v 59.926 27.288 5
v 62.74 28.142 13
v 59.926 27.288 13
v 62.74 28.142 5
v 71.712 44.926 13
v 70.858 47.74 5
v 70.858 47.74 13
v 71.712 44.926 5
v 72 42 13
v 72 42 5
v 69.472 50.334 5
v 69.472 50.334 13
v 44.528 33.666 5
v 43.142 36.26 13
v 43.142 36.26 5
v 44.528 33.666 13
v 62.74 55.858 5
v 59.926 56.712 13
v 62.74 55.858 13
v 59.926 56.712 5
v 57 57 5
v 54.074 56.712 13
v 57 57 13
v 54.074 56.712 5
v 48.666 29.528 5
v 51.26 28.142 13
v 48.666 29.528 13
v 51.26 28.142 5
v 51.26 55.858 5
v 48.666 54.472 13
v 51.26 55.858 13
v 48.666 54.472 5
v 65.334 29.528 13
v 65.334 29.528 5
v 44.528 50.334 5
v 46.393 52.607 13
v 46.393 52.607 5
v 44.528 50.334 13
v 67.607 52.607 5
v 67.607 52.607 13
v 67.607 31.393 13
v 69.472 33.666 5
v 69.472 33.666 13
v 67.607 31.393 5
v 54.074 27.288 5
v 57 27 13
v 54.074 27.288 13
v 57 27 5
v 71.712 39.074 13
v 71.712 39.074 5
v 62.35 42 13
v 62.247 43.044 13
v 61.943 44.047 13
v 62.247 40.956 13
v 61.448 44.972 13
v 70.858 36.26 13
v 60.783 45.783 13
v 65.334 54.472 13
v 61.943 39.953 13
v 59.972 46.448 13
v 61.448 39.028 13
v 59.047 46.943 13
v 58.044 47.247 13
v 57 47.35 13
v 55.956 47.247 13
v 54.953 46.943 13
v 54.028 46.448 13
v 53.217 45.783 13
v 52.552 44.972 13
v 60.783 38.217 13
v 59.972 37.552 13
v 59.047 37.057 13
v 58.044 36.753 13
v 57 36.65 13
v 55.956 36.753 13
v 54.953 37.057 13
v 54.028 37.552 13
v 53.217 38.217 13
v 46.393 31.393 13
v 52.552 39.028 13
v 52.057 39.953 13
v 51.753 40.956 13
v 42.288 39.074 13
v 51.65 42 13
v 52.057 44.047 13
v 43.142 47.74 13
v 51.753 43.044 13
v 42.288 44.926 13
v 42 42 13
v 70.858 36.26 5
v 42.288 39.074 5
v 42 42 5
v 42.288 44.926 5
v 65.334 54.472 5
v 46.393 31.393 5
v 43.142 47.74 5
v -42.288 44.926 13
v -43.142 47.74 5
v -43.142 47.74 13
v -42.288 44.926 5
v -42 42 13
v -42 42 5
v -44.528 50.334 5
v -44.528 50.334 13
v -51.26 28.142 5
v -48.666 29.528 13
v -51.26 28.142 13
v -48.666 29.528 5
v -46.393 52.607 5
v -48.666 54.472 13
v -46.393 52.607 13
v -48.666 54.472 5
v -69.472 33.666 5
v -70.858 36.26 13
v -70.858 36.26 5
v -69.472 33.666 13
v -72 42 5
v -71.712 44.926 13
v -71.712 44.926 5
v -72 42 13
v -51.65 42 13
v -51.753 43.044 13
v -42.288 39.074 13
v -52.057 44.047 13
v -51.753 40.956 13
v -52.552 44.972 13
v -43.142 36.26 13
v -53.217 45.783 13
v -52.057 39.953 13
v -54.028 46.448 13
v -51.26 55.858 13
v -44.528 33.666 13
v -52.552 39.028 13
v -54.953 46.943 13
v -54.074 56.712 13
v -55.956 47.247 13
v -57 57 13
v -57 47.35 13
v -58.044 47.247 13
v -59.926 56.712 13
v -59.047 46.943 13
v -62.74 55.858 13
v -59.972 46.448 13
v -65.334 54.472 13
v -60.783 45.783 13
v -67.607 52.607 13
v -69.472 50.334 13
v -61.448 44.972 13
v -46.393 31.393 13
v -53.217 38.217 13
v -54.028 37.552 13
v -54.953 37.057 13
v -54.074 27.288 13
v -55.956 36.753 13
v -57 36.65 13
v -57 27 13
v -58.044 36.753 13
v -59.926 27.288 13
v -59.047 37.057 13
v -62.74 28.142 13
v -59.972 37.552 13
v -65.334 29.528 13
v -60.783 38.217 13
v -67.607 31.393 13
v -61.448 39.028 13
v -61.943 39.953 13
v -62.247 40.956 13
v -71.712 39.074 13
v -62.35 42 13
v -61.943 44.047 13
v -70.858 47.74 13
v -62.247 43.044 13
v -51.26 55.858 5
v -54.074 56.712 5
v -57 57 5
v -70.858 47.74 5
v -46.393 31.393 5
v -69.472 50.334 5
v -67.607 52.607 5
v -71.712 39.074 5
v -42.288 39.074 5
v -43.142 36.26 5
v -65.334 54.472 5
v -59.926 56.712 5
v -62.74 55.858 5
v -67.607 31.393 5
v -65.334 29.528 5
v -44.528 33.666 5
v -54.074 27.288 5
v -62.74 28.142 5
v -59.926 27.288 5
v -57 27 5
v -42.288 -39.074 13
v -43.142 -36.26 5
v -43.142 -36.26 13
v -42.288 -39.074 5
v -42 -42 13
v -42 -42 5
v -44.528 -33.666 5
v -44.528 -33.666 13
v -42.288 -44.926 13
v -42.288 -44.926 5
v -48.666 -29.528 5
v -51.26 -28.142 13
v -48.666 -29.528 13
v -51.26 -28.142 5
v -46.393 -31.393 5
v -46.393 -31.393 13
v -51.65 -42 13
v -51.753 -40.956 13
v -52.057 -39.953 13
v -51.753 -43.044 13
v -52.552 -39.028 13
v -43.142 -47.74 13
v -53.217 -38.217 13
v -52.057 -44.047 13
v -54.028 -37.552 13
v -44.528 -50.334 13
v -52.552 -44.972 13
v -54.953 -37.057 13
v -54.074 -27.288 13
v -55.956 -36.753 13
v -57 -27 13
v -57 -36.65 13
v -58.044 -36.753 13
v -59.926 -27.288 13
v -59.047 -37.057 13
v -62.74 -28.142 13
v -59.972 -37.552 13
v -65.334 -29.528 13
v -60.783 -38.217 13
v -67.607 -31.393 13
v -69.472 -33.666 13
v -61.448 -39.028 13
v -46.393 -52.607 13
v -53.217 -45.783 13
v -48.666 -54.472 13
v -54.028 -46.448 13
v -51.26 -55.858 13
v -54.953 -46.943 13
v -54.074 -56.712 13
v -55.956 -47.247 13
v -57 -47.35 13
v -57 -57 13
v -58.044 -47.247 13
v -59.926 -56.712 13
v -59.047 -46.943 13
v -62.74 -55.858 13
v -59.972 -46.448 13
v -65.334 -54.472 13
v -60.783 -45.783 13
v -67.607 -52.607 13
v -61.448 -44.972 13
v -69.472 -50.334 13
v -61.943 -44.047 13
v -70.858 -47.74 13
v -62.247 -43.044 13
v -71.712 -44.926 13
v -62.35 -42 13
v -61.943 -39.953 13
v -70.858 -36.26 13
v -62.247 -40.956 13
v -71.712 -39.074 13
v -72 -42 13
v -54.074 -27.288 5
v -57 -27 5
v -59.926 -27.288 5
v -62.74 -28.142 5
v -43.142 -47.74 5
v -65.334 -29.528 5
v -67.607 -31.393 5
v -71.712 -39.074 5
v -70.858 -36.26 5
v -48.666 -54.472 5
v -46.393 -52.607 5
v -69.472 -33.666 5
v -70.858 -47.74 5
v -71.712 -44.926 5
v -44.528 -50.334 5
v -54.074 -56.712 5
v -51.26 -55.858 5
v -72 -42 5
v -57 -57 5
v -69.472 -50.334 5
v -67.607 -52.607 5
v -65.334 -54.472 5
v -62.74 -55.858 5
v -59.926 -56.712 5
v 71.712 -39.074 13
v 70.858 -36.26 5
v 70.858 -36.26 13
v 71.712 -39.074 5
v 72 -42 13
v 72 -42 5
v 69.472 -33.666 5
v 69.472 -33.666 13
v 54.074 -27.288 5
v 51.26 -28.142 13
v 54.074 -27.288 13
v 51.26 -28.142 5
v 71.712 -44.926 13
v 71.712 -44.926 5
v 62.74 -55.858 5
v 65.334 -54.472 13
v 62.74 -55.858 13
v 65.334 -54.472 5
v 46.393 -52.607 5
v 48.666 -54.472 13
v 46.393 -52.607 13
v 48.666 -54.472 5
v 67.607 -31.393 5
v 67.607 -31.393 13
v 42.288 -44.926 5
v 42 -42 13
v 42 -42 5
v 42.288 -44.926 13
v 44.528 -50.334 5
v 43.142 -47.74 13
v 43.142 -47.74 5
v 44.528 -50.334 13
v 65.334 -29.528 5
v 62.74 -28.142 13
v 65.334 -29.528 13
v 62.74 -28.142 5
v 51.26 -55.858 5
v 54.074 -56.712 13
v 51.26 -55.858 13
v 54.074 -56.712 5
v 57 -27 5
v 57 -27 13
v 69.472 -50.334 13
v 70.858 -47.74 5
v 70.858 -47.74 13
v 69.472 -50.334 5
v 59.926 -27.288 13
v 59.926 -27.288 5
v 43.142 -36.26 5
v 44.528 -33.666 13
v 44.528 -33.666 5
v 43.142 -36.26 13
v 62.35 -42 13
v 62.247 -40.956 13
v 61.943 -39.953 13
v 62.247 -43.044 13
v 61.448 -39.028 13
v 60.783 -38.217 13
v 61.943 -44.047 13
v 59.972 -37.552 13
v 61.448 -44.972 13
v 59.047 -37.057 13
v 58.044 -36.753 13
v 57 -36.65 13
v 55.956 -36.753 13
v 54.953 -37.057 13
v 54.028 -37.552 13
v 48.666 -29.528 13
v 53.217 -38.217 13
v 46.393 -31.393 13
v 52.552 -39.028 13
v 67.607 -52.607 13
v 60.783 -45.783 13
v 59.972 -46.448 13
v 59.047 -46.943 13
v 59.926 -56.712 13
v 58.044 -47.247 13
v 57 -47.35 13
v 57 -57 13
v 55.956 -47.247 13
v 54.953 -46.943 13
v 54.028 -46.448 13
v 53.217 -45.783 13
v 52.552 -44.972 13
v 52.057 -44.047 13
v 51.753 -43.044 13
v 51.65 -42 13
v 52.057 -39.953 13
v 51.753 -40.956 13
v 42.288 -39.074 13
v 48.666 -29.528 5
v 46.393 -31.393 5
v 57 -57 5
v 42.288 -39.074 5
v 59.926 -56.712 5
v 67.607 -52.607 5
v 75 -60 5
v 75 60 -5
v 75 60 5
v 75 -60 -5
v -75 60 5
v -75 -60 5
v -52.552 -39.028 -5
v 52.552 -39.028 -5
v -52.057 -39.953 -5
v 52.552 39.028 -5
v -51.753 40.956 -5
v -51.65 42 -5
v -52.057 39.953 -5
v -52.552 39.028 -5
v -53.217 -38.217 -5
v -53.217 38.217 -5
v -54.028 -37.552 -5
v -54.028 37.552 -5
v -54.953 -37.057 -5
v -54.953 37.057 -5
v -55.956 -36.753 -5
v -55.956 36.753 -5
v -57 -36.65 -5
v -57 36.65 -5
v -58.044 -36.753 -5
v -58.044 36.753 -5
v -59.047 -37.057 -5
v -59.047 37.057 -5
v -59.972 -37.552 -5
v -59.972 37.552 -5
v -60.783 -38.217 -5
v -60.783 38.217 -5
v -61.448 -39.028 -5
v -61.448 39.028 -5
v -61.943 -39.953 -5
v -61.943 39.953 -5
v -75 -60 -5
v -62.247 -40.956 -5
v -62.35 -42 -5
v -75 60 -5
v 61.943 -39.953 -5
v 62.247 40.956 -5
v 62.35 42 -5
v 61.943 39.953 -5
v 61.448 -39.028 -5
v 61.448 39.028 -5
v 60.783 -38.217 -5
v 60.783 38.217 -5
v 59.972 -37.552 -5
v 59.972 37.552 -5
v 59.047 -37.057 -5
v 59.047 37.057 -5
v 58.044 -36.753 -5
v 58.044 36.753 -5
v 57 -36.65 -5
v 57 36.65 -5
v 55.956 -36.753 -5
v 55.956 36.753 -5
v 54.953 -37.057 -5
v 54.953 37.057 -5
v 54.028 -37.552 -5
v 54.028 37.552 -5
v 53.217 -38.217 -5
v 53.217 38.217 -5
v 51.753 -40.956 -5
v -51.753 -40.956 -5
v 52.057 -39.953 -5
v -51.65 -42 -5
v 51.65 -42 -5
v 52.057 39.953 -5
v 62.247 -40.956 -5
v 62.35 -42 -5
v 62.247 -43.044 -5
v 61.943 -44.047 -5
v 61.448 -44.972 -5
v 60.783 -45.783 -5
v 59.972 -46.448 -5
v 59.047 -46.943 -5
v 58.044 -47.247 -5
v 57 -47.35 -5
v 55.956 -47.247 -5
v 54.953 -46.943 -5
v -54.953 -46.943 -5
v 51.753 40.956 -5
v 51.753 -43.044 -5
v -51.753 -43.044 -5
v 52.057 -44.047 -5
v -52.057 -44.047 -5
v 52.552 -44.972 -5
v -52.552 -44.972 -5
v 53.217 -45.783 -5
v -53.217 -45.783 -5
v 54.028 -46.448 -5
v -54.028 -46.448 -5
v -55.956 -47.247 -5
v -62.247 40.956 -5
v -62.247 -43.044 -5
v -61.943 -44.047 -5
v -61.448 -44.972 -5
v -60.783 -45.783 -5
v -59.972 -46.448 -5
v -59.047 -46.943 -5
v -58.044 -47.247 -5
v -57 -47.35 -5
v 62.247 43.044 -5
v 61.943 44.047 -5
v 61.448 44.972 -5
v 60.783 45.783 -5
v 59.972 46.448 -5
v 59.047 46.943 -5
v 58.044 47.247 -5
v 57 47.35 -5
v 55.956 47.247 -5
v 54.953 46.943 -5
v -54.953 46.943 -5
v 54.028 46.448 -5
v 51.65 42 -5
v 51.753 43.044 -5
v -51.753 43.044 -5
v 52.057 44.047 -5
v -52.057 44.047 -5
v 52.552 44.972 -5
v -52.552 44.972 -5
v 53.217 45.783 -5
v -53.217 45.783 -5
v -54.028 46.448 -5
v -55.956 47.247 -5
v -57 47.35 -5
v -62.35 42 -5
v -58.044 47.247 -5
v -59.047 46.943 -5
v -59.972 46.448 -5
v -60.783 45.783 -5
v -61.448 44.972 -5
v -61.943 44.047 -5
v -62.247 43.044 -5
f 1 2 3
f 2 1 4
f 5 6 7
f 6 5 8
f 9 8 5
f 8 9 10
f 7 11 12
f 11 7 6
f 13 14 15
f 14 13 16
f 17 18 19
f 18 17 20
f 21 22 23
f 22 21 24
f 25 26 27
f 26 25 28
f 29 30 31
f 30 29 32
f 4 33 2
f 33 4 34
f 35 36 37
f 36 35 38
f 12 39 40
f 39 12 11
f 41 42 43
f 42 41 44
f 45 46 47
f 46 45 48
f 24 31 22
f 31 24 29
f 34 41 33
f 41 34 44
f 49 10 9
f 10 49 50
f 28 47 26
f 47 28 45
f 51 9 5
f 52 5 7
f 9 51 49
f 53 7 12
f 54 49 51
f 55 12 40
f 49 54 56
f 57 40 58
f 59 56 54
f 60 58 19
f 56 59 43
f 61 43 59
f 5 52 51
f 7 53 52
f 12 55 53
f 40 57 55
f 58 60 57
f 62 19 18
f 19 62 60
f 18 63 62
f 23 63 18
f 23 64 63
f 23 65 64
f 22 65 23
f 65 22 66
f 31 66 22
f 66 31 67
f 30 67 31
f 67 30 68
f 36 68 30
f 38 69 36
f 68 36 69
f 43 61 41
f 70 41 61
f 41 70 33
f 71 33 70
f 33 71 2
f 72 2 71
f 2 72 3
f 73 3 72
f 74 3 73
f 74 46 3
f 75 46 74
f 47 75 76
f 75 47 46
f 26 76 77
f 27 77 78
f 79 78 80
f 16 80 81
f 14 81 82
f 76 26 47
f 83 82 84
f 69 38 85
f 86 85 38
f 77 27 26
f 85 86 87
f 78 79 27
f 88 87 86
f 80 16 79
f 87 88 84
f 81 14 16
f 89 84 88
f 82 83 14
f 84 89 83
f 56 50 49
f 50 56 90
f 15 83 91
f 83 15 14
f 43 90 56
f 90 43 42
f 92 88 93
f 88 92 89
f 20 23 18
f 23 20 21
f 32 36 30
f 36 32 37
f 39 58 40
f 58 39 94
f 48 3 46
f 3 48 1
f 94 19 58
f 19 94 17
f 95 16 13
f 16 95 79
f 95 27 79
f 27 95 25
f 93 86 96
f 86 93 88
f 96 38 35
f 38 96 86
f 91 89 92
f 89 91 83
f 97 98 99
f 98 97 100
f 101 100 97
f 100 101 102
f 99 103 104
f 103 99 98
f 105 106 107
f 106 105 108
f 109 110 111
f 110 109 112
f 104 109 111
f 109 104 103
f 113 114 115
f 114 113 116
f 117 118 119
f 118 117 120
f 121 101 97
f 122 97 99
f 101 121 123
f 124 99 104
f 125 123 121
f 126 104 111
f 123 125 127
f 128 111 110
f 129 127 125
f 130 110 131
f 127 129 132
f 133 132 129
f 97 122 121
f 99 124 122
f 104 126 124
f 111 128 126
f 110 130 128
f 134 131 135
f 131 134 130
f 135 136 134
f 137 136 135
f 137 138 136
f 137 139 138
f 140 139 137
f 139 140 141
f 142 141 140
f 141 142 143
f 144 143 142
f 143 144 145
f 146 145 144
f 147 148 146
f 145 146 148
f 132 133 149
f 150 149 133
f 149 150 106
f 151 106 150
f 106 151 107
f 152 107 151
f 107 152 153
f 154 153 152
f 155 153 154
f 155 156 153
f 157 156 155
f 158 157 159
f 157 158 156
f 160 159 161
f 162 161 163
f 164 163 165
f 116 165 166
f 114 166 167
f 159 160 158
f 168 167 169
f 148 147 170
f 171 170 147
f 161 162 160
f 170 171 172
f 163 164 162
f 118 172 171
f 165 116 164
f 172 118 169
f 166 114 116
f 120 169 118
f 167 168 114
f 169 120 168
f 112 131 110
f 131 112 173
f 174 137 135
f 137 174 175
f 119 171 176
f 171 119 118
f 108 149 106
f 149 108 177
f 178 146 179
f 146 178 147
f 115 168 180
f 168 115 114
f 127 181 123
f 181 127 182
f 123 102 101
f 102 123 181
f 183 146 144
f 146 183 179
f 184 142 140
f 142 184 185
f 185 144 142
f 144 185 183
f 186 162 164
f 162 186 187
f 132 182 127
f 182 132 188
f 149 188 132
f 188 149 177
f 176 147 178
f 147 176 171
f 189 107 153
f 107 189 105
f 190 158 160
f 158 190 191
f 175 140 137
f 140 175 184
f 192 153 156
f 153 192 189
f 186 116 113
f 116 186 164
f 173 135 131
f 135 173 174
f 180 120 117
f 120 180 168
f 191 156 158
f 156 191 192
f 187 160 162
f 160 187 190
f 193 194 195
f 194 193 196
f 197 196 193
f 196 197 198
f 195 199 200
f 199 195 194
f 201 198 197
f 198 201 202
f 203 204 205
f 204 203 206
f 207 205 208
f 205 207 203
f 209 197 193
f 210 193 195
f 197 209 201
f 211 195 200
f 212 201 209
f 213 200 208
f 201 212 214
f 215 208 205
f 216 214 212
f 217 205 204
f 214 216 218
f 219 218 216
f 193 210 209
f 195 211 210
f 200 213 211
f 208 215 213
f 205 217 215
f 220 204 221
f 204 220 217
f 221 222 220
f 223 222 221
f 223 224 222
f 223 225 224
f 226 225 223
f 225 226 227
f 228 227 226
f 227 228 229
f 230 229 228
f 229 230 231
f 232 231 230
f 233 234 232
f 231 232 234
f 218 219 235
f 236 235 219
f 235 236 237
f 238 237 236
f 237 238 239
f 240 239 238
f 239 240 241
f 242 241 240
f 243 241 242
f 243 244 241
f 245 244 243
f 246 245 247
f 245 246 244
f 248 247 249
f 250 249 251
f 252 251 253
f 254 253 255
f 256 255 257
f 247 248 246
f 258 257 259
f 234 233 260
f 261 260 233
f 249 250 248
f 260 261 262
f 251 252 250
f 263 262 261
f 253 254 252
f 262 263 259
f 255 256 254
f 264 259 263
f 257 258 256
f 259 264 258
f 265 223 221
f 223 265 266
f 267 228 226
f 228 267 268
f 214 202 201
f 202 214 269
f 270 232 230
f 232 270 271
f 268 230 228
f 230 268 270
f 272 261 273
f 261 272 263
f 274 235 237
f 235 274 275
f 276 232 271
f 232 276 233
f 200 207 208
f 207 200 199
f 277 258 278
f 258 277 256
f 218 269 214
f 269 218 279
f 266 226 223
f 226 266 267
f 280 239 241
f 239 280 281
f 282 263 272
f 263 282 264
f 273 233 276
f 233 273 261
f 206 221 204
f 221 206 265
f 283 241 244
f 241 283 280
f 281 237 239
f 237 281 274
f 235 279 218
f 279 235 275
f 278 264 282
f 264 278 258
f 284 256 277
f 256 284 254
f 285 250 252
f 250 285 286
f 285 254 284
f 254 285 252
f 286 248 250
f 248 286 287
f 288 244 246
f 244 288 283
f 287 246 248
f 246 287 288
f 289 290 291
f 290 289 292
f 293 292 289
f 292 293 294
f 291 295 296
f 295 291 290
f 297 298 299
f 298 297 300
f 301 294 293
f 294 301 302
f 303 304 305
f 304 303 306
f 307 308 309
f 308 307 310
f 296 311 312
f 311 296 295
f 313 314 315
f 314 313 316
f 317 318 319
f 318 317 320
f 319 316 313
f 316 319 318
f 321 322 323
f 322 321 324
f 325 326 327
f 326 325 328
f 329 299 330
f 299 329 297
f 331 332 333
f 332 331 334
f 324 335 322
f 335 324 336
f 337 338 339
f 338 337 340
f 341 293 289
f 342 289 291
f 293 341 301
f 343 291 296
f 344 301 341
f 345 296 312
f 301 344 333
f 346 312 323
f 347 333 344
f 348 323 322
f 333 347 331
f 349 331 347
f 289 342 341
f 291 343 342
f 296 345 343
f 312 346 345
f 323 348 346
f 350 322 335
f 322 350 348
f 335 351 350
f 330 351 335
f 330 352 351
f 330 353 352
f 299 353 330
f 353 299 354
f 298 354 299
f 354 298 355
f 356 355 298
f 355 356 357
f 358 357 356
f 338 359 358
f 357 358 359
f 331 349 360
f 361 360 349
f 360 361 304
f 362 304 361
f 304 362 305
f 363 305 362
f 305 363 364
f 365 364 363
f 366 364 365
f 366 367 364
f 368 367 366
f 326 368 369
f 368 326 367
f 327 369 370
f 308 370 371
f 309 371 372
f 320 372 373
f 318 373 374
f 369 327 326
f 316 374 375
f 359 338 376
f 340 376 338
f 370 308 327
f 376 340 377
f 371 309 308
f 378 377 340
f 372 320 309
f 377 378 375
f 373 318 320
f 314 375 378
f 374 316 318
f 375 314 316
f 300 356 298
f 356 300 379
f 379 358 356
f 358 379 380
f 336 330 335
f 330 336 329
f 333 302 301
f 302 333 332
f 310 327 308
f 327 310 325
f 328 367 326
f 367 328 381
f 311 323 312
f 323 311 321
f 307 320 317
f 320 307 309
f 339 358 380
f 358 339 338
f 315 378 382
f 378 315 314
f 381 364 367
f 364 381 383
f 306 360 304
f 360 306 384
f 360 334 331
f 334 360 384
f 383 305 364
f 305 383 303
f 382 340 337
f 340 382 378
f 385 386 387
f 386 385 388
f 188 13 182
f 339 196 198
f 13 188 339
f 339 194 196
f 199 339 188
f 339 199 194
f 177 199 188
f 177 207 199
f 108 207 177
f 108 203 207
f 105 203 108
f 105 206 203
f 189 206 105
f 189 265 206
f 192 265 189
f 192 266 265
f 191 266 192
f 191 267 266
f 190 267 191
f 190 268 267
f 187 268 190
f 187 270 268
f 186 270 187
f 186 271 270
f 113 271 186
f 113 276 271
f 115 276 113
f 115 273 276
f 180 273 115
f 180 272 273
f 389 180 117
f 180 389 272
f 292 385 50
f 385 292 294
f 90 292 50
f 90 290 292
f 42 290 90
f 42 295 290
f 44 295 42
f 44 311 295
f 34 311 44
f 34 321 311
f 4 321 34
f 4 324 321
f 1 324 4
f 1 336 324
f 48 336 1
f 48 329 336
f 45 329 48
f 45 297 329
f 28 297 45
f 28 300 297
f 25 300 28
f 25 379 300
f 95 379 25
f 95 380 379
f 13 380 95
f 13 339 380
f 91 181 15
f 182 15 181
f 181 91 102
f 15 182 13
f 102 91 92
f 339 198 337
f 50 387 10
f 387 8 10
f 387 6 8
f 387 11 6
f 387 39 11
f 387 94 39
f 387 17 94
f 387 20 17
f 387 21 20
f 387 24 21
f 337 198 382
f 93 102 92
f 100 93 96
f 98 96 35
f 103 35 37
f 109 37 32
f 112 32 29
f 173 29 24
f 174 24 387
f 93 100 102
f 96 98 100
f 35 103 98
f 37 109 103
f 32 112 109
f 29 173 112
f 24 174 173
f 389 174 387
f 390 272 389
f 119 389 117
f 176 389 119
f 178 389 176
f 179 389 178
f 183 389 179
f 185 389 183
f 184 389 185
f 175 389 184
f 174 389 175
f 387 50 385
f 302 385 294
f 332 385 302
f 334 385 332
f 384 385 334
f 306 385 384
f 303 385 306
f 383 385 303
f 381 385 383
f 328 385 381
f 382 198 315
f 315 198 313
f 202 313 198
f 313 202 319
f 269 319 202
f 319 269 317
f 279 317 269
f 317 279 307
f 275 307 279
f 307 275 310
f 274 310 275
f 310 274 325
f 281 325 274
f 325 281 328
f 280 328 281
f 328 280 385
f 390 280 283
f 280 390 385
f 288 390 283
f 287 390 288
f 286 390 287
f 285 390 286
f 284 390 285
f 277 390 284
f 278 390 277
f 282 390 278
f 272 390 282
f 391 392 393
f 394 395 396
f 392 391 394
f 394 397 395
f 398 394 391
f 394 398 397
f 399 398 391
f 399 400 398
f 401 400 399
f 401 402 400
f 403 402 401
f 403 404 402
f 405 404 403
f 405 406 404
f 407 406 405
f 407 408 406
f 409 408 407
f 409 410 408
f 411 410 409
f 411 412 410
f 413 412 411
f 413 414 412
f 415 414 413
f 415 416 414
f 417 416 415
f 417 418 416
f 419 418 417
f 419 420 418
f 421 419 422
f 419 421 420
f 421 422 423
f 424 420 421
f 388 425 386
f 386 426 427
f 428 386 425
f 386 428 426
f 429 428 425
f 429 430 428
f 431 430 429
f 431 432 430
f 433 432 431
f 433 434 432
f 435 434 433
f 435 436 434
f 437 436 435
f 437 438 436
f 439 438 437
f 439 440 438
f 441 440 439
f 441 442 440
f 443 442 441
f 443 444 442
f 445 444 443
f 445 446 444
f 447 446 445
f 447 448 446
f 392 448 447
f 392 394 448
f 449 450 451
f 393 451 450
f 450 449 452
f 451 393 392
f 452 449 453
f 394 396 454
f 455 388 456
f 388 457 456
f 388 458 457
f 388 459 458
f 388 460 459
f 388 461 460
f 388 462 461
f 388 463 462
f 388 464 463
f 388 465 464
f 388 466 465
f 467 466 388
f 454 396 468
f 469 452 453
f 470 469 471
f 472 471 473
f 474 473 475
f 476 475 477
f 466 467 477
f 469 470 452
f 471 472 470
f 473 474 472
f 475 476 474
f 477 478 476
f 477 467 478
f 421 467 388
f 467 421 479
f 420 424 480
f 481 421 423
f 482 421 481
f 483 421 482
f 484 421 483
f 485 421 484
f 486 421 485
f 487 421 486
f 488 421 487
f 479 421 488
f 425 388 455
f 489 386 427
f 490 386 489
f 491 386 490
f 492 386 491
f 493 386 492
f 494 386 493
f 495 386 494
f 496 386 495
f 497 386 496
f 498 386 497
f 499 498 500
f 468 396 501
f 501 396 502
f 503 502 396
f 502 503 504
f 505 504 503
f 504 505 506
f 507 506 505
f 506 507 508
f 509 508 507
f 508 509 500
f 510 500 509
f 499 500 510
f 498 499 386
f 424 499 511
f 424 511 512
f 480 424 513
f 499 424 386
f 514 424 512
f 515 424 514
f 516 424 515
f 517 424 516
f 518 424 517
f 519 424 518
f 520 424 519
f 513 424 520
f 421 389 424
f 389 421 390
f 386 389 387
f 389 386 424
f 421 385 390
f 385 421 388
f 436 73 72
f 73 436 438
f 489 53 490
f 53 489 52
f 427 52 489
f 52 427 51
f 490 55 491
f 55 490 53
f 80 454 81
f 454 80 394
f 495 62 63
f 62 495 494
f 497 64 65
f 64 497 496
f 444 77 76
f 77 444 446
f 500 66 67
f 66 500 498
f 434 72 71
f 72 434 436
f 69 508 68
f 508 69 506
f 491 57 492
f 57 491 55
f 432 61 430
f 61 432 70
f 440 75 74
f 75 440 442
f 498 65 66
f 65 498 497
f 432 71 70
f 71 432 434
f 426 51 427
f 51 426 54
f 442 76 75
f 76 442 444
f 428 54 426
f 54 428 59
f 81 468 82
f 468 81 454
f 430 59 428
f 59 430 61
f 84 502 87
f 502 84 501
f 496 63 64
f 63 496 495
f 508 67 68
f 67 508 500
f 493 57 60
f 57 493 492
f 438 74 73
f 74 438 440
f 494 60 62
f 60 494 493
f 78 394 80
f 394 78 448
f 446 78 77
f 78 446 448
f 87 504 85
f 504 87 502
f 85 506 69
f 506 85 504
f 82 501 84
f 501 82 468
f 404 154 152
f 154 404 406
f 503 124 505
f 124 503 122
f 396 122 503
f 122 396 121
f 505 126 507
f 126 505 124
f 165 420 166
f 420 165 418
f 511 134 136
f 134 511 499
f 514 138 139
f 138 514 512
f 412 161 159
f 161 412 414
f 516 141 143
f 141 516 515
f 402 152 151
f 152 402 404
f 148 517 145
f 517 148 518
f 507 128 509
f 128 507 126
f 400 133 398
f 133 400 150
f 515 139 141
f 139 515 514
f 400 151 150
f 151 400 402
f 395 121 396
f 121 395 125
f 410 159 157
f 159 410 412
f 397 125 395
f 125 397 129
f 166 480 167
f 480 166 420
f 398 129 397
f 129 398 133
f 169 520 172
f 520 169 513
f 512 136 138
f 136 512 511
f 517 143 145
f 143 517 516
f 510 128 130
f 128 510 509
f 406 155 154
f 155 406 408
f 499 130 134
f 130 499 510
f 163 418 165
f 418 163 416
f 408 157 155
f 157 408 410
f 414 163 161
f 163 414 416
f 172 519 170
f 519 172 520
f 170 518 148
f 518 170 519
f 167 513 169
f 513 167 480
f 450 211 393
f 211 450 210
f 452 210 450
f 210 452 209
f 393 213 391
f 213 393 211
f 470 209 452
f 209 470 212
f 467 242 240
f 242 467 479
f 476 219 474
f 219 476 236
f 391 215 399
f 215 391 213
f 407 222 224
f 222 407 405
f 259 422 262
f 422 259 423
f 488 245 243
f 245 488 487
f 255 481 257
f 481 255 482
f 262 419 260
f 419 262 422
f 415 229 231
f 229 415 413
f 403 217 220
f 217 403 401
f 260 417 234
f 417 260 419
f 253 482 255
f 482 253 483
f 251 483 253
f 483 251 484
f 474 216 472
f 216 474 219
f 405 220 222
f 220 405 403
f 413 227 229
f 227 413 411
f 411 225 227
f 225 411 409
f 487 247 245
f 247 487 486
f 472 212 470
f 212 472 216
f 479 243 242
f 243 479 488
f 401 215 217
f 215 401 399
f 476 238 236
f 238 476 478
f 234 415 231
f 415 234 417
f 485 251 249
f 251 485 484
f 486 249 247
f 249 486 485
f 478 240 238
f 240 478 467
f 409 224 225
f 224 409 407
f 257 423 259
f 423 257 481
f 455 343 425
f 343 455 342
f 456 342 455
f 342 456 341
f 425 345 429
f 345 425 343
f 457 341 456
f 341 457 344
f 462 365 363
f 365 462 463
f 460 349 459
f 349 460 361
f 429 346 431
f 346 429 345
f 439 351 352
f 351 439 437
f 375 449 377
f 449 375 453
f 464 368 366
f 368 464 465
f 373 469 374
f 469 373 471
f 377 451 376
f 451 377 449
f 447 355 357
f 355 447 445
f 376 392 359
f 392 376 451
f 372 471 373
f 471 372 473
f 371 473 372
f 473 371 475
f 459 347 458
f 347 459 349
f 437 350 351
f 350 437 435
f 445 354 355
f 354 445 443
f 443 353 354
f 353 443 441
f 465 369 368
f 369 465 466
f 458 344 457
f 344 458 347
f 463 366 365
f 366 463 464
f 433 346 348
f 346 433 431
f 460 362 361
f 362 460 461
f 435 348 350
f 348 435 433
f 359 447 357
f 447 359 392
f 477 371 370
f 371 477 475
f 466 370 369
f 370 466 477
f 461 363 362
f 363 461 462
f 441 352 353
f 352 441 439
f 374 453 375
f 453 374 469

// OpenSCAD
$fn = 32;

// ----------------------------------------------------------------------
// Anchor pads 150 x 120 x 18
// four corner bosses with anchor holes
// ----------------------------------------------------------------------

// --- parameters (mm) ---
plate = [150, 120, 10];  // base plate size (x, y, z)
pads = 4;                // boss count, one per corner
edge = 18;               // boss centre offset from the plate edge
boss_d = 30;             // boss diameter
boss_h = 8;              // boss height above the base plate
bore_d = 10.5;           // nominal hole diameter from the drawing
print_allowance = 0.2;   // clearance added for printing

// --- derived feature positions (mm) ---
hole_d = bore_d + print_allowance;  // = 10.7   hole diameter as printed
height = plate[2] + boss_h;         // = 18   overall height of the part
corner_x = plate[0] / 2 - edge;     // = 57   boss centre X
corner_y = plate[1] / 2 - edge;     // = 42   boss centre Y
feature_centers = [
  [corner_x, corner_y],
  [-corner_x, corner_y],
  [-corner_x, -corner_y],
  [corner_x, -corner_y]
];   // boss centres, anchor holes are drilled there

// base plate, four bosses standing on it, anchor holes all the way through
difference() {
  union() {
    cube(plate, center = true);
    for (centre = feature_centers)
      translate([centre[0], centre[1], plate[2] / 2 - 1])
        cylinder(d = boss_d, h = boss_h + 1);
  }
  for (centre = feature_centers)
    translate([centre[0], centre[1], -height])
      cylinder(d = hole_d, h = 2 * height + 2);  // through boss and plate
}
